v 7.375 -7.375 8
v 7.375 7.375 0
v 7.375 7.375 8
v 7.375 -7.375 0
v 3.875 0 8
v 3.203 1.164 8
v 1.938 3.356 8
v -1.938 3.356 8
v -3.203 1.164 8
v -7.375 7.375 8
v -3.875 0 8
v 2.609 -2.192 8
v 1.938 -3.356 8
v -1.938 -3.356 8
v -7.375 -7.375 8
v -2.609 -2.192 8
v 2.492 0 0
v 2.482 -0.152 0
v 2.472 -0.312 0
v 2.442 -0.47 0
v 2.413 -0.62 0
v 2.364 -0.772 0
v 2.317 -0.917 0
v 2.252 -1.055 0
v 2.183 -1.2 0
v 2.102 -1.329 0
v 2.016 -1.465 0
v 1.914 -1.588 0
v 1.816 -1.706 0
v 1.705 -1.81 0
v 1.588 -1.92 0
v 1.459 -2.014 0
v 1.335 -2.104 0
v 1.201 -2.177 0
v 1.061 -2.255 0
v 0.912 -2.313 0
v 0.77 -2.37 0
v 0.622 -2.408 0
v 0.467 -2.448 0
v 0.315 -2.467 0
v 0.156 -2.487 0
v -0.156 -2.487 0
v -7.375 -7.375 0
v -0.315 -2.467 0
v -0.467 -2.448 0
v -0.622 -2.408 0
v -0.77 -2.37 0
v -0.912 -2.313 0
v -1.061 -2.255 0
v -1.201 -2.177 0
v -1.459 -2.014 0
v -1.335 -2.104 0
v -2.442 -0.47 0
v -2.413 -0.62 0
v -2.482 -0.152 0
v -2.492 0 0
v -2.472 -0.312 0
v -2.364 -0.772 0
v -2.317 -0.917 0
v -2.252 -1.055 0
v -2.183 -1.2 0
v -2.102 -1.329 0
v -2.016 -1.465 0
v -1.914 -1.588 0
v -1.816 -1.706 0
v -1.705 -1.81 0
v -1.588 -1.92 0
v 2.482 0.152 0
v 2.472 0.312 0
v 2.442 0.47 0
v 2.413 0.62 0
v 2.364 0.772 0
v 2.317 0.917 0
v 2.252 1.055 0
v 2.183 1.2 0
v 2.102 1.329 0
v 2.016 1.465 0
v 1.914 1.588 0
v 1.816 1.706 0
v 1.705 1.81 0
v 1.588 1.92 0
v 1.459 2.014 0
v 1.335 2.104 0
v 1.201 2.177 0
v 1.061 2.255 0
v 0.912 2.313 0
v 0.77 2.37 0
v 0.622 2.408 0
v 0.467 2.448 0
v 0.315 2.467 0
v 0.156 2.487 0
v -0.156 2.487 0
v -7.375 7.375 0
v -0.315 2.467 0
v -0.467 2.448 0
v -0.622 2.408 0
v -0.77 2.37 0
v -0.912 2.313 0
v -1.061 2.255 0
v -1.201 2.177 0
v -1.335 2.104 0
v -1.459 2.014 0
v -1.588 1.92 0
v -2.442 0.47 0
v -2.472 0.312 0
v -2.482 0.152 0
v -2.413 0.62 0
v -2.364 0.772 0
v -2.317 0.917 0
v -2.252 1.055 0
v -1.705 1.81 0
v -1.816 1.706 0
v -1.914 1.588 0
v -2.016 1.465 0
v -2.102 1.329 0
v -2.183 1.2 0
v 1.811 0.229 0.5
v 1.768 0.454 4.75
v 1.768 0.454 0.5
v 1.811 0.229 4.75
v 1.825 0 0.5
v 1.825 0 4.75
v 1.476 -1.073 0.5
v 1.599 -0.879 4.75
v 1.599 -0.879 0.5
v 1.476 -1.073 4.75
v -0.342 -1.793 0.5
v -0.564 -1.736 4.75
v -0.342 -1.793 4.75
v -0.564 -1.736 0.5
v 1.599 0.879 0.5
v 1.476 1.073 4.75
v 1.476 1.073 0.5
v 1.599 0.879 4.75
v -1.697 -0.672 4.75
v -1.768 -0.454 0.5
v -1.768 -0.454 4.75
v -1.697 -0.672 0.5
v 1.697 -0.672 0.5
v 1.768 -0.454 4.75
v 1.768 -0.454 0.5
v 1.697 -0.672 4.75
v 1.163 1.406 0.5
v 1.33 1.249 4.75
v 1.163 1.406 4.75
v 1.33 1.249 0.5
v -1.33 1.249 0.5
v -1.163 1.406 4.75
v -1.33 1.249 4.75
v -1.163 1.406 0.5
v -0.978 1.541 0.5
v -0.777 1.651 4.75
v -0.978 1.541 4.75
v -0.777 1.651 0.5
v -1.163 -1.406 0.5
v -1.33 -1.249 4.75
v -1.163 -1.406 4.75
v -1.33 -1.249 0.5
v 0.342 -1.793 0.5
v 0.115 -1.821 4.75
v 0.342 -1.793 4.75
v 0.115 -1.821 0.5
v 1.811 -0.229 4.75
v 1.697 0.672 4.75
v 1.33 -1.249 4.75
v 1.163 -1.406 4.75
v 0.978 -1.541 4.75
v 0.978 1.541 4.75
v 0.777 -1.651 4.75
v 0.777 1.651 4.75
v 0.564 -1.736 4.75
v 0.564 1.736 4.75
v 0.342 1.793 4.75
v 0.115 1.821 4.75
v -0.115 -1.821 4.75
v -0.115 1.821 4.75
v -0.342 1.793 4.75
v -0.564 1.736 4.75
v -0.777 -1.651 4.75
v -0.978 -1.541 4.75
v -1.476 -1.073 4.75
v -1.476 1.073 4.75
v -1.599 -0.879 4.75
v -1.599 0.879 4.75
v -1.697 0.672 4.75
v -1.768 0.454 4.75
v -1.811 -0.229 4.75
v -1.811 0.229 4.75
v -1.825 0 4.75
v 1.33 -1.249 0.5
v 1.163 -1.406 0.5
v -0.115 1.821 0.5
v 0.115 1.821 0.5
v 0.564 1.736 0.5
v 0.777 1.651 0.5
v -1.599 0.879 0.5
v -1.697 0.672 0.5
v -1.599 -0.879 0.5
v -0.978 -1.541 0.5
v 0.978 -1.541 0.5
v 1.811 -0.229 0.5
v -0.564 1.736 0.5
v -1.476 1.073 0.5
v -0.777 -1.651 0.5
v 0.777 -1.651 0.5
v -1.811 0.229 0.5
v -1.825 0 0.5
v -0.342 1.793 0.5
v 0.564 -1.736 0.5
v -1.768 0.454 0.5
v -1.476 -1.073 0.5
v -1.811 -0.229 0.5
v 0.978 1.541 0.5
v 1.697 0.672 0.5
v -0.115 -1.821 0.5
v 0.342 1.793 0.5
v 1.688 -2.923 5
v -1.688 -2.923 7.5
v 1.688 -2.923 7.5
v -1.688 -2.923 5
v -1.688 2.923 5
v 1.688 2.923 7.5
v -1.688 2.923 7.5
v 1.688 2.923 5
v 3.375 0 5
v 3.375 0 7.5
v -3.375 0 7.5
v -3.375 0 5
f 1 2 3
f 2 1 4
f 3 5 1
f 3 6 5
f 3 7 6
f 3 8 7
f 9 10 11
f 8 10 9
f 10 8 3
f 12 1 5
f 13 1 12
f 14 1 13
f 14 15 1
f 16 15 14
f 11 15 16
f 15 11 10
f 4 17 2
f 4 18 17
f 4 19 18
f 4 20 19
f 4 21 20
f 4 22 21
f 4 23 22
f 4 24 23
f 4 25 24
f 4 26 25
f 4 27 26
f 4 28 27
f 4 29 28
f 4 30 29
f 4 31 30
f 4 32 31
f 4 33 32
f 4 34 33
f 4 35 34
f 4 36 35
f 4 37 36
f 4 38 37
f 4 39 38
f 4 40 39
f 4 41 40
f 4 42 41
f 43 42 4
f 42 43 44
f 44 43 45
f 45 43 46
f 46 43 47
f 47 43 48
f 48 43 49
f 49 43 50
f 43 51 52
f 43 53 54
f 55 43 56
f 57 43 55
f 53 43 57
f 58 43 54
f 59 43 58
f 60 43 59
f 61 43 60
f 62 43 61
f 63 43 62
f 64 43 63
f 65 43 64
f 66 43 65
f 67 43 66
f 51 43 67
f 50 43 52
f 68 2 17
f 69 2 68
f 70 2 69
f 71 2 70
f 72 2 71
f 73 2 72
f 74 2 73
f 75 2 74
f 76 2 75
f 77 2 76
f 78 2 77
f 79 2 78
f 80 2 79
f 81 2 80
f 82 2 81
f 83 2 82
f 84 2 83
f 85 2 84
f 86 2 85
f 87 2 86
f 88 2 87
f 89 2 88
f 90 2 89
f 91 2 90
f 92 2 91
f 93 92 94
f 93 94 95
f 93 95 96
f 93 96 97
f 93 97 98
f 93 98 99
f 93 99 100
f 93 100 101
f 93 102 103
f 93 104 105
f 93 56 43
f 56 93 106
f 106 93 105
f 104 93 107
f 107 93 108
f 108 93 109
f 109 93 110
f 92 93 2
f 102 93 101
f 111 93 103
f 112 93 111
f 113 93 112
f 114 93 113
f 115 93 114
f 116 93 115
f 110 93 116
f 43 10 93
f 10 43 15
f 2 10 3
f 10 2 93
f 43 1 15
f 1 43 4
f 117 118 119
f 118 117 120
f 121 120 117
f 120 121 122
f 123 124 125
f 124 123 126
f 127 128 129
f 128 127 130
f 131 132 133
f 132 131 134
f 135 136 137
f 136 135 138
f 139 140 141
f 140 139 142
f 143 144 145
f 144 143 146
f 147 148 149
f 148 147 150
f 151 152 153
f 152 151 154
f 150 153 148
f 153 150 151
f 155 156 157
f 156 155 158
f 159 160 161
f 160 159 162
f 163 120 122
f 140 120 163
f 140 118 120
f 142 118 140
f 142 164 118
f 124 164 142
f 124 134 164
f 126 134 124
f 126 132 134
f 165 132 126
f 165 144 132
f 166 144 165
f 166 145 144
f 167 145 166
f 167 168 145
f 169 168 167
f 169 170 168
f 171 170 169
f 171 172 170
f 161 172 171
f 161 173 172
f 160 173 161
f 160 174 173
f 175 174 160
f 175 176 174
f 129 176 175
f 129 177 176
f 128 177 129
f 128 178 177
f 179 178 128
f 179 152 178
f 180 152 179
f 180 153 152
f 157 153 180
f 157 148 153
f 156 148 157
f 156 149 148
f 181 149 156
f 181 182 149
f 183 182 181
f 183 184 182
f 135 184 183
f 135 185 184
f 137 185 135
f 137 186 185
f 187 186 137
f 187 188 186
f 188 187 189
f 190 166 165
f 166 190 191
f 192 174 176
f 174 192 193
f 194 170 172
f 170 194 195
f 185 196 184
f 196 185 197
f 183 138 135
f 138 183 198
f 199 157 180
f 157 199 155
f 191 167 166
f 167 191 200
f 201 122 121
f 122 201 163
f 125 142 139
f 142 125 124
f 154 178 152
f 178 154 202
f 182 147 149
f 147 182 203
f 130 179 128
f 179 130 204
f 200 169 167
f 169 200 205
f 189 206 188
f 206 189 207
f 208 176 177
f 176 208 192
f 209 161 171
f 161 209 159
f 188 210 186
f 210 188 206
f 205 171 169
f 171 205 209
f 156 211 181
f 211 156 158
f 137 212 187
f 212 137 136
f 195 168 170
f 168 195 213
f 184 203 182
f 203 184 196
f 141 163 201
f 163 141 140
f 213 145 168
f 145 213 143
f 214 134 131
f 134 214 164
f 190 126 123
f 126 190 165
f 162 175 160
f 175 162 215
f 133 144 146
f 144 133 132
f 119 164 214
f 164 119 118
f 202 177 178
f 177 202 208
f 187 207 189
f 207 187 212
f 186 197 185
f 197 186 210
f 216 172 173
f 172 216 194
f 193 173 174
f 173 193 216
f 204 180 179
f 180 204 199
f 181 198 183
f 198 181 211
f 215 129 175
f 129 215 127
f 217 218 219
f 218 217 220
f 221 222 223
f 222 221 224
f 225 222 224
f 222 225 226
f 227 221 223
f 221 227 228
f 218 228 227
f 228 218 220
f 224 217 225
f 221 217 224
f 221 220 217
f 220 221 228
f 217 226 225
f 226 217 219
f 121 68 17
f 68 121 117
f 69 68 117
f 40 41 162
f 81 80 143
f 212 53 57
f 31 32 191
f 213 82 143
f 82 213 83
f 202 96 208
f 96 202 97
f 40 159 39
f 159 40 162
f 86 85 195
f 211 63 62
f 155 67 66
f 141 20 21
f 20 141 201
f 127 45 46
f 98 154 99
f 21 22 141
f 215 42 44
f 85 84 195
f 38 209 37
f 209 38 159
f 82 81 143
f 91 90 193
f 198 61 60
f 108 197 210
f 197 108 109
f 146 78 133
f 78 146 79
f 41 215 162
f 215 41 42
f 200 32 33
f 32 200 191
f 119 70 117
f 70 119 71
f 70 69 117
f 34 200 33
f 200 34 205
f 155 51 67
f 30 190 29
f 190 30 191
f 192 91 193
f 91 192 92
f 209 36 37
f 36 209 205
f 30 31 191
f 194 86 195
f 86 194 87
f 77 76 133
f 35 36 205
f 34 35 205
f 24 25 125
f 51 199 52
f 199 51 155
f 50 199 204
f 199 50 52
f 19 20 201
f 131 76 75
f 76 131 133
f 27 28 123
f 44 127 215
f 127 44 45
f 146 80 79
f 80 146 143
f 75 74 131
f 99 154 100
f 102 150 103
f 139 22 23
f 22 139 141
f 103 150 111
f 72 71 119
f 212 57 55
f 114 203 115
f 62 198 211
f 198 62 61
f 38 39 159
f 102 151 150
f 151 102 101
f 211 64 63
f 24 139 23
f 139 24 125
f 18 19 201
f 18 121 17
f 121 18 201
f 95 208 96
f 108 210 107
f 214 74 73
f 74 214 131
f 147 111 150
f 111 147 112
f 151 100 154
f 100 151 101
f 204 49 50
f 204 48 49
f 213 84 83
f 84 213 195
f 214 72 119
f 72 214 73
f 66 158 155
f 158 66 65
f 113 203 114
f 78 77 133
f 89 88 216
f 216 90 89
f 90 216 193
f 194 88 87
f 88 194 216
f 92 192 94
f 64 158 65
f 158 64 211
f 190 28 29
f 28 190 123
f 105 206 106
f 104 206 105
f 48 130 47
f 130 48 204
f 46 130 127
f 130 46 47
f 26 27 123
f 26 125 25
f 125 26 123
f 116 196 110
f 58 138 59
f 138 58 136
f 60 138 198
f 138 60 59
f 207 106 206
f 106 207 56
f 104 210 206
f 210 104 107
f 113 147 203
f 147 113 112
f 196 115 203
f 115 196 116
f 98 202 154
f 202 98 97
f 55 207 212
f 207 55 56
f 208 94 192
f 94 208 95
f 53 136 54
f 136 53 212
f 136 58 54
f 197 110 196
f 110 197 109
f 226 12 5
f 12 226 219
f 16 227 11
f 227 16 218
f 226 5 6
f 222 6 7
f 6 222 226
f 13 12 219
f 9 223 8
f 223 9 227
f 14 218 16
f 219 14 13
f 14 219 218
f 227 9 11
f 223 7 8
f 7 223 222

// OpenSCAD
// [FL_INDEX: keywords="openscad, 3d_parametric, Hex_Nut_Capture_Socket_Sizing_Calibration, csg_solid" | COT="Parametric OpenSCAD design from 3DCodeverse"]
// Title: Hex Nut Capture Socket Sizing Calibration

// File: 3d_print_screw_hole_test.scad
// Author: Mark Heywood alias Airtripper
// Airtripper Extruder Filament Force Sensor Bracket
// by Airtripper May 2013
// Copyright © 2013 Airtripper
// http://www.airtripper.com
// Licensed Attribution-NonCommercial-ShareAlike 3.0 Unported. 
// Last edit: 26/09/2013




/* [Global] */

//  - Select part to view/print from list
view_part = 1;	// [0:design, 1:head_up, 2:head_down, 3:horizontal]


//  - Screw head diameter - flat side to flat side on hex nut or bolt head
head = 6.75;		
//  - Screw head type - [6] for hex head and [50] or more for round head
type = 6;			
//  - Screw size diameter
size = 3.65;		
//  - Screw size diameter smoothness
smoothness = 50;	
//  - Screw size length - not including screw head
length = 5;			
//  - Screw head length
cap = 3;			
//  - Block border thickness between screw head and block edge
border = 4;			
//  - Print layer thickness - only required for head down print
layer = 0.25;			



/* hidden */

//++++++++++++++++++++ Model View, Positioning and Rotation ++++++++++++++++++++


if (view_part == 0) {	// Original design view & position
	translate([0,0,0]) rotate([0,0,0]) screw_block();
}
if (view_part == 1) {	// Centred head up position
	translate([-((border*2)+head)/2,-((border*2)+head)/2,0]) rotate([0,0,0]) screw_block();
}
if (view_part == 2) {	// Centred head down position
	translate([((border*2)+head)/2,-((border*2)+head)/2,length+cap]) rotate([0,-180,0]) screw_block();
}
if (view_part == 3) {	// Centred horizontal position
	translate([-((border*2)+head)/2,(length+cap)/2,0]) rotate([90,0,0]) screw_block();
}


//++++++++++++++++++++ Script Subroutines ++++++++++++++++++++


//######################### Screw Block ##########################

// screw_block();

module screw_block() {
	difference() {
		translate([0,0,0]) cube([head+(border*2),head+(border*2),length+cap]);	// block
		translate([border+(head/2),border+(head/2),-1-layer]) cylinder(length+1, r=size/2, $fn=smoothness);	// screw size
		translate([border+(head/2),border+(head/2),length]) cylinder(cap+1, r=head/2, $fn=type);	// screw head/cap
		translate([border+(head/2),border+(head/2),-1]) color("red") cylinder(1.5, r1=(size/2)+2, r2=size/2, $fn=smoothness);	// screw size taper
		translate([border+(head/2),border+(head/2),length+cap-0.5]) color("red") cylinder(2, r1=head/2, r2=(head/2)+2, $fn=type);	// screw head/cap taper
	}

}














// end
